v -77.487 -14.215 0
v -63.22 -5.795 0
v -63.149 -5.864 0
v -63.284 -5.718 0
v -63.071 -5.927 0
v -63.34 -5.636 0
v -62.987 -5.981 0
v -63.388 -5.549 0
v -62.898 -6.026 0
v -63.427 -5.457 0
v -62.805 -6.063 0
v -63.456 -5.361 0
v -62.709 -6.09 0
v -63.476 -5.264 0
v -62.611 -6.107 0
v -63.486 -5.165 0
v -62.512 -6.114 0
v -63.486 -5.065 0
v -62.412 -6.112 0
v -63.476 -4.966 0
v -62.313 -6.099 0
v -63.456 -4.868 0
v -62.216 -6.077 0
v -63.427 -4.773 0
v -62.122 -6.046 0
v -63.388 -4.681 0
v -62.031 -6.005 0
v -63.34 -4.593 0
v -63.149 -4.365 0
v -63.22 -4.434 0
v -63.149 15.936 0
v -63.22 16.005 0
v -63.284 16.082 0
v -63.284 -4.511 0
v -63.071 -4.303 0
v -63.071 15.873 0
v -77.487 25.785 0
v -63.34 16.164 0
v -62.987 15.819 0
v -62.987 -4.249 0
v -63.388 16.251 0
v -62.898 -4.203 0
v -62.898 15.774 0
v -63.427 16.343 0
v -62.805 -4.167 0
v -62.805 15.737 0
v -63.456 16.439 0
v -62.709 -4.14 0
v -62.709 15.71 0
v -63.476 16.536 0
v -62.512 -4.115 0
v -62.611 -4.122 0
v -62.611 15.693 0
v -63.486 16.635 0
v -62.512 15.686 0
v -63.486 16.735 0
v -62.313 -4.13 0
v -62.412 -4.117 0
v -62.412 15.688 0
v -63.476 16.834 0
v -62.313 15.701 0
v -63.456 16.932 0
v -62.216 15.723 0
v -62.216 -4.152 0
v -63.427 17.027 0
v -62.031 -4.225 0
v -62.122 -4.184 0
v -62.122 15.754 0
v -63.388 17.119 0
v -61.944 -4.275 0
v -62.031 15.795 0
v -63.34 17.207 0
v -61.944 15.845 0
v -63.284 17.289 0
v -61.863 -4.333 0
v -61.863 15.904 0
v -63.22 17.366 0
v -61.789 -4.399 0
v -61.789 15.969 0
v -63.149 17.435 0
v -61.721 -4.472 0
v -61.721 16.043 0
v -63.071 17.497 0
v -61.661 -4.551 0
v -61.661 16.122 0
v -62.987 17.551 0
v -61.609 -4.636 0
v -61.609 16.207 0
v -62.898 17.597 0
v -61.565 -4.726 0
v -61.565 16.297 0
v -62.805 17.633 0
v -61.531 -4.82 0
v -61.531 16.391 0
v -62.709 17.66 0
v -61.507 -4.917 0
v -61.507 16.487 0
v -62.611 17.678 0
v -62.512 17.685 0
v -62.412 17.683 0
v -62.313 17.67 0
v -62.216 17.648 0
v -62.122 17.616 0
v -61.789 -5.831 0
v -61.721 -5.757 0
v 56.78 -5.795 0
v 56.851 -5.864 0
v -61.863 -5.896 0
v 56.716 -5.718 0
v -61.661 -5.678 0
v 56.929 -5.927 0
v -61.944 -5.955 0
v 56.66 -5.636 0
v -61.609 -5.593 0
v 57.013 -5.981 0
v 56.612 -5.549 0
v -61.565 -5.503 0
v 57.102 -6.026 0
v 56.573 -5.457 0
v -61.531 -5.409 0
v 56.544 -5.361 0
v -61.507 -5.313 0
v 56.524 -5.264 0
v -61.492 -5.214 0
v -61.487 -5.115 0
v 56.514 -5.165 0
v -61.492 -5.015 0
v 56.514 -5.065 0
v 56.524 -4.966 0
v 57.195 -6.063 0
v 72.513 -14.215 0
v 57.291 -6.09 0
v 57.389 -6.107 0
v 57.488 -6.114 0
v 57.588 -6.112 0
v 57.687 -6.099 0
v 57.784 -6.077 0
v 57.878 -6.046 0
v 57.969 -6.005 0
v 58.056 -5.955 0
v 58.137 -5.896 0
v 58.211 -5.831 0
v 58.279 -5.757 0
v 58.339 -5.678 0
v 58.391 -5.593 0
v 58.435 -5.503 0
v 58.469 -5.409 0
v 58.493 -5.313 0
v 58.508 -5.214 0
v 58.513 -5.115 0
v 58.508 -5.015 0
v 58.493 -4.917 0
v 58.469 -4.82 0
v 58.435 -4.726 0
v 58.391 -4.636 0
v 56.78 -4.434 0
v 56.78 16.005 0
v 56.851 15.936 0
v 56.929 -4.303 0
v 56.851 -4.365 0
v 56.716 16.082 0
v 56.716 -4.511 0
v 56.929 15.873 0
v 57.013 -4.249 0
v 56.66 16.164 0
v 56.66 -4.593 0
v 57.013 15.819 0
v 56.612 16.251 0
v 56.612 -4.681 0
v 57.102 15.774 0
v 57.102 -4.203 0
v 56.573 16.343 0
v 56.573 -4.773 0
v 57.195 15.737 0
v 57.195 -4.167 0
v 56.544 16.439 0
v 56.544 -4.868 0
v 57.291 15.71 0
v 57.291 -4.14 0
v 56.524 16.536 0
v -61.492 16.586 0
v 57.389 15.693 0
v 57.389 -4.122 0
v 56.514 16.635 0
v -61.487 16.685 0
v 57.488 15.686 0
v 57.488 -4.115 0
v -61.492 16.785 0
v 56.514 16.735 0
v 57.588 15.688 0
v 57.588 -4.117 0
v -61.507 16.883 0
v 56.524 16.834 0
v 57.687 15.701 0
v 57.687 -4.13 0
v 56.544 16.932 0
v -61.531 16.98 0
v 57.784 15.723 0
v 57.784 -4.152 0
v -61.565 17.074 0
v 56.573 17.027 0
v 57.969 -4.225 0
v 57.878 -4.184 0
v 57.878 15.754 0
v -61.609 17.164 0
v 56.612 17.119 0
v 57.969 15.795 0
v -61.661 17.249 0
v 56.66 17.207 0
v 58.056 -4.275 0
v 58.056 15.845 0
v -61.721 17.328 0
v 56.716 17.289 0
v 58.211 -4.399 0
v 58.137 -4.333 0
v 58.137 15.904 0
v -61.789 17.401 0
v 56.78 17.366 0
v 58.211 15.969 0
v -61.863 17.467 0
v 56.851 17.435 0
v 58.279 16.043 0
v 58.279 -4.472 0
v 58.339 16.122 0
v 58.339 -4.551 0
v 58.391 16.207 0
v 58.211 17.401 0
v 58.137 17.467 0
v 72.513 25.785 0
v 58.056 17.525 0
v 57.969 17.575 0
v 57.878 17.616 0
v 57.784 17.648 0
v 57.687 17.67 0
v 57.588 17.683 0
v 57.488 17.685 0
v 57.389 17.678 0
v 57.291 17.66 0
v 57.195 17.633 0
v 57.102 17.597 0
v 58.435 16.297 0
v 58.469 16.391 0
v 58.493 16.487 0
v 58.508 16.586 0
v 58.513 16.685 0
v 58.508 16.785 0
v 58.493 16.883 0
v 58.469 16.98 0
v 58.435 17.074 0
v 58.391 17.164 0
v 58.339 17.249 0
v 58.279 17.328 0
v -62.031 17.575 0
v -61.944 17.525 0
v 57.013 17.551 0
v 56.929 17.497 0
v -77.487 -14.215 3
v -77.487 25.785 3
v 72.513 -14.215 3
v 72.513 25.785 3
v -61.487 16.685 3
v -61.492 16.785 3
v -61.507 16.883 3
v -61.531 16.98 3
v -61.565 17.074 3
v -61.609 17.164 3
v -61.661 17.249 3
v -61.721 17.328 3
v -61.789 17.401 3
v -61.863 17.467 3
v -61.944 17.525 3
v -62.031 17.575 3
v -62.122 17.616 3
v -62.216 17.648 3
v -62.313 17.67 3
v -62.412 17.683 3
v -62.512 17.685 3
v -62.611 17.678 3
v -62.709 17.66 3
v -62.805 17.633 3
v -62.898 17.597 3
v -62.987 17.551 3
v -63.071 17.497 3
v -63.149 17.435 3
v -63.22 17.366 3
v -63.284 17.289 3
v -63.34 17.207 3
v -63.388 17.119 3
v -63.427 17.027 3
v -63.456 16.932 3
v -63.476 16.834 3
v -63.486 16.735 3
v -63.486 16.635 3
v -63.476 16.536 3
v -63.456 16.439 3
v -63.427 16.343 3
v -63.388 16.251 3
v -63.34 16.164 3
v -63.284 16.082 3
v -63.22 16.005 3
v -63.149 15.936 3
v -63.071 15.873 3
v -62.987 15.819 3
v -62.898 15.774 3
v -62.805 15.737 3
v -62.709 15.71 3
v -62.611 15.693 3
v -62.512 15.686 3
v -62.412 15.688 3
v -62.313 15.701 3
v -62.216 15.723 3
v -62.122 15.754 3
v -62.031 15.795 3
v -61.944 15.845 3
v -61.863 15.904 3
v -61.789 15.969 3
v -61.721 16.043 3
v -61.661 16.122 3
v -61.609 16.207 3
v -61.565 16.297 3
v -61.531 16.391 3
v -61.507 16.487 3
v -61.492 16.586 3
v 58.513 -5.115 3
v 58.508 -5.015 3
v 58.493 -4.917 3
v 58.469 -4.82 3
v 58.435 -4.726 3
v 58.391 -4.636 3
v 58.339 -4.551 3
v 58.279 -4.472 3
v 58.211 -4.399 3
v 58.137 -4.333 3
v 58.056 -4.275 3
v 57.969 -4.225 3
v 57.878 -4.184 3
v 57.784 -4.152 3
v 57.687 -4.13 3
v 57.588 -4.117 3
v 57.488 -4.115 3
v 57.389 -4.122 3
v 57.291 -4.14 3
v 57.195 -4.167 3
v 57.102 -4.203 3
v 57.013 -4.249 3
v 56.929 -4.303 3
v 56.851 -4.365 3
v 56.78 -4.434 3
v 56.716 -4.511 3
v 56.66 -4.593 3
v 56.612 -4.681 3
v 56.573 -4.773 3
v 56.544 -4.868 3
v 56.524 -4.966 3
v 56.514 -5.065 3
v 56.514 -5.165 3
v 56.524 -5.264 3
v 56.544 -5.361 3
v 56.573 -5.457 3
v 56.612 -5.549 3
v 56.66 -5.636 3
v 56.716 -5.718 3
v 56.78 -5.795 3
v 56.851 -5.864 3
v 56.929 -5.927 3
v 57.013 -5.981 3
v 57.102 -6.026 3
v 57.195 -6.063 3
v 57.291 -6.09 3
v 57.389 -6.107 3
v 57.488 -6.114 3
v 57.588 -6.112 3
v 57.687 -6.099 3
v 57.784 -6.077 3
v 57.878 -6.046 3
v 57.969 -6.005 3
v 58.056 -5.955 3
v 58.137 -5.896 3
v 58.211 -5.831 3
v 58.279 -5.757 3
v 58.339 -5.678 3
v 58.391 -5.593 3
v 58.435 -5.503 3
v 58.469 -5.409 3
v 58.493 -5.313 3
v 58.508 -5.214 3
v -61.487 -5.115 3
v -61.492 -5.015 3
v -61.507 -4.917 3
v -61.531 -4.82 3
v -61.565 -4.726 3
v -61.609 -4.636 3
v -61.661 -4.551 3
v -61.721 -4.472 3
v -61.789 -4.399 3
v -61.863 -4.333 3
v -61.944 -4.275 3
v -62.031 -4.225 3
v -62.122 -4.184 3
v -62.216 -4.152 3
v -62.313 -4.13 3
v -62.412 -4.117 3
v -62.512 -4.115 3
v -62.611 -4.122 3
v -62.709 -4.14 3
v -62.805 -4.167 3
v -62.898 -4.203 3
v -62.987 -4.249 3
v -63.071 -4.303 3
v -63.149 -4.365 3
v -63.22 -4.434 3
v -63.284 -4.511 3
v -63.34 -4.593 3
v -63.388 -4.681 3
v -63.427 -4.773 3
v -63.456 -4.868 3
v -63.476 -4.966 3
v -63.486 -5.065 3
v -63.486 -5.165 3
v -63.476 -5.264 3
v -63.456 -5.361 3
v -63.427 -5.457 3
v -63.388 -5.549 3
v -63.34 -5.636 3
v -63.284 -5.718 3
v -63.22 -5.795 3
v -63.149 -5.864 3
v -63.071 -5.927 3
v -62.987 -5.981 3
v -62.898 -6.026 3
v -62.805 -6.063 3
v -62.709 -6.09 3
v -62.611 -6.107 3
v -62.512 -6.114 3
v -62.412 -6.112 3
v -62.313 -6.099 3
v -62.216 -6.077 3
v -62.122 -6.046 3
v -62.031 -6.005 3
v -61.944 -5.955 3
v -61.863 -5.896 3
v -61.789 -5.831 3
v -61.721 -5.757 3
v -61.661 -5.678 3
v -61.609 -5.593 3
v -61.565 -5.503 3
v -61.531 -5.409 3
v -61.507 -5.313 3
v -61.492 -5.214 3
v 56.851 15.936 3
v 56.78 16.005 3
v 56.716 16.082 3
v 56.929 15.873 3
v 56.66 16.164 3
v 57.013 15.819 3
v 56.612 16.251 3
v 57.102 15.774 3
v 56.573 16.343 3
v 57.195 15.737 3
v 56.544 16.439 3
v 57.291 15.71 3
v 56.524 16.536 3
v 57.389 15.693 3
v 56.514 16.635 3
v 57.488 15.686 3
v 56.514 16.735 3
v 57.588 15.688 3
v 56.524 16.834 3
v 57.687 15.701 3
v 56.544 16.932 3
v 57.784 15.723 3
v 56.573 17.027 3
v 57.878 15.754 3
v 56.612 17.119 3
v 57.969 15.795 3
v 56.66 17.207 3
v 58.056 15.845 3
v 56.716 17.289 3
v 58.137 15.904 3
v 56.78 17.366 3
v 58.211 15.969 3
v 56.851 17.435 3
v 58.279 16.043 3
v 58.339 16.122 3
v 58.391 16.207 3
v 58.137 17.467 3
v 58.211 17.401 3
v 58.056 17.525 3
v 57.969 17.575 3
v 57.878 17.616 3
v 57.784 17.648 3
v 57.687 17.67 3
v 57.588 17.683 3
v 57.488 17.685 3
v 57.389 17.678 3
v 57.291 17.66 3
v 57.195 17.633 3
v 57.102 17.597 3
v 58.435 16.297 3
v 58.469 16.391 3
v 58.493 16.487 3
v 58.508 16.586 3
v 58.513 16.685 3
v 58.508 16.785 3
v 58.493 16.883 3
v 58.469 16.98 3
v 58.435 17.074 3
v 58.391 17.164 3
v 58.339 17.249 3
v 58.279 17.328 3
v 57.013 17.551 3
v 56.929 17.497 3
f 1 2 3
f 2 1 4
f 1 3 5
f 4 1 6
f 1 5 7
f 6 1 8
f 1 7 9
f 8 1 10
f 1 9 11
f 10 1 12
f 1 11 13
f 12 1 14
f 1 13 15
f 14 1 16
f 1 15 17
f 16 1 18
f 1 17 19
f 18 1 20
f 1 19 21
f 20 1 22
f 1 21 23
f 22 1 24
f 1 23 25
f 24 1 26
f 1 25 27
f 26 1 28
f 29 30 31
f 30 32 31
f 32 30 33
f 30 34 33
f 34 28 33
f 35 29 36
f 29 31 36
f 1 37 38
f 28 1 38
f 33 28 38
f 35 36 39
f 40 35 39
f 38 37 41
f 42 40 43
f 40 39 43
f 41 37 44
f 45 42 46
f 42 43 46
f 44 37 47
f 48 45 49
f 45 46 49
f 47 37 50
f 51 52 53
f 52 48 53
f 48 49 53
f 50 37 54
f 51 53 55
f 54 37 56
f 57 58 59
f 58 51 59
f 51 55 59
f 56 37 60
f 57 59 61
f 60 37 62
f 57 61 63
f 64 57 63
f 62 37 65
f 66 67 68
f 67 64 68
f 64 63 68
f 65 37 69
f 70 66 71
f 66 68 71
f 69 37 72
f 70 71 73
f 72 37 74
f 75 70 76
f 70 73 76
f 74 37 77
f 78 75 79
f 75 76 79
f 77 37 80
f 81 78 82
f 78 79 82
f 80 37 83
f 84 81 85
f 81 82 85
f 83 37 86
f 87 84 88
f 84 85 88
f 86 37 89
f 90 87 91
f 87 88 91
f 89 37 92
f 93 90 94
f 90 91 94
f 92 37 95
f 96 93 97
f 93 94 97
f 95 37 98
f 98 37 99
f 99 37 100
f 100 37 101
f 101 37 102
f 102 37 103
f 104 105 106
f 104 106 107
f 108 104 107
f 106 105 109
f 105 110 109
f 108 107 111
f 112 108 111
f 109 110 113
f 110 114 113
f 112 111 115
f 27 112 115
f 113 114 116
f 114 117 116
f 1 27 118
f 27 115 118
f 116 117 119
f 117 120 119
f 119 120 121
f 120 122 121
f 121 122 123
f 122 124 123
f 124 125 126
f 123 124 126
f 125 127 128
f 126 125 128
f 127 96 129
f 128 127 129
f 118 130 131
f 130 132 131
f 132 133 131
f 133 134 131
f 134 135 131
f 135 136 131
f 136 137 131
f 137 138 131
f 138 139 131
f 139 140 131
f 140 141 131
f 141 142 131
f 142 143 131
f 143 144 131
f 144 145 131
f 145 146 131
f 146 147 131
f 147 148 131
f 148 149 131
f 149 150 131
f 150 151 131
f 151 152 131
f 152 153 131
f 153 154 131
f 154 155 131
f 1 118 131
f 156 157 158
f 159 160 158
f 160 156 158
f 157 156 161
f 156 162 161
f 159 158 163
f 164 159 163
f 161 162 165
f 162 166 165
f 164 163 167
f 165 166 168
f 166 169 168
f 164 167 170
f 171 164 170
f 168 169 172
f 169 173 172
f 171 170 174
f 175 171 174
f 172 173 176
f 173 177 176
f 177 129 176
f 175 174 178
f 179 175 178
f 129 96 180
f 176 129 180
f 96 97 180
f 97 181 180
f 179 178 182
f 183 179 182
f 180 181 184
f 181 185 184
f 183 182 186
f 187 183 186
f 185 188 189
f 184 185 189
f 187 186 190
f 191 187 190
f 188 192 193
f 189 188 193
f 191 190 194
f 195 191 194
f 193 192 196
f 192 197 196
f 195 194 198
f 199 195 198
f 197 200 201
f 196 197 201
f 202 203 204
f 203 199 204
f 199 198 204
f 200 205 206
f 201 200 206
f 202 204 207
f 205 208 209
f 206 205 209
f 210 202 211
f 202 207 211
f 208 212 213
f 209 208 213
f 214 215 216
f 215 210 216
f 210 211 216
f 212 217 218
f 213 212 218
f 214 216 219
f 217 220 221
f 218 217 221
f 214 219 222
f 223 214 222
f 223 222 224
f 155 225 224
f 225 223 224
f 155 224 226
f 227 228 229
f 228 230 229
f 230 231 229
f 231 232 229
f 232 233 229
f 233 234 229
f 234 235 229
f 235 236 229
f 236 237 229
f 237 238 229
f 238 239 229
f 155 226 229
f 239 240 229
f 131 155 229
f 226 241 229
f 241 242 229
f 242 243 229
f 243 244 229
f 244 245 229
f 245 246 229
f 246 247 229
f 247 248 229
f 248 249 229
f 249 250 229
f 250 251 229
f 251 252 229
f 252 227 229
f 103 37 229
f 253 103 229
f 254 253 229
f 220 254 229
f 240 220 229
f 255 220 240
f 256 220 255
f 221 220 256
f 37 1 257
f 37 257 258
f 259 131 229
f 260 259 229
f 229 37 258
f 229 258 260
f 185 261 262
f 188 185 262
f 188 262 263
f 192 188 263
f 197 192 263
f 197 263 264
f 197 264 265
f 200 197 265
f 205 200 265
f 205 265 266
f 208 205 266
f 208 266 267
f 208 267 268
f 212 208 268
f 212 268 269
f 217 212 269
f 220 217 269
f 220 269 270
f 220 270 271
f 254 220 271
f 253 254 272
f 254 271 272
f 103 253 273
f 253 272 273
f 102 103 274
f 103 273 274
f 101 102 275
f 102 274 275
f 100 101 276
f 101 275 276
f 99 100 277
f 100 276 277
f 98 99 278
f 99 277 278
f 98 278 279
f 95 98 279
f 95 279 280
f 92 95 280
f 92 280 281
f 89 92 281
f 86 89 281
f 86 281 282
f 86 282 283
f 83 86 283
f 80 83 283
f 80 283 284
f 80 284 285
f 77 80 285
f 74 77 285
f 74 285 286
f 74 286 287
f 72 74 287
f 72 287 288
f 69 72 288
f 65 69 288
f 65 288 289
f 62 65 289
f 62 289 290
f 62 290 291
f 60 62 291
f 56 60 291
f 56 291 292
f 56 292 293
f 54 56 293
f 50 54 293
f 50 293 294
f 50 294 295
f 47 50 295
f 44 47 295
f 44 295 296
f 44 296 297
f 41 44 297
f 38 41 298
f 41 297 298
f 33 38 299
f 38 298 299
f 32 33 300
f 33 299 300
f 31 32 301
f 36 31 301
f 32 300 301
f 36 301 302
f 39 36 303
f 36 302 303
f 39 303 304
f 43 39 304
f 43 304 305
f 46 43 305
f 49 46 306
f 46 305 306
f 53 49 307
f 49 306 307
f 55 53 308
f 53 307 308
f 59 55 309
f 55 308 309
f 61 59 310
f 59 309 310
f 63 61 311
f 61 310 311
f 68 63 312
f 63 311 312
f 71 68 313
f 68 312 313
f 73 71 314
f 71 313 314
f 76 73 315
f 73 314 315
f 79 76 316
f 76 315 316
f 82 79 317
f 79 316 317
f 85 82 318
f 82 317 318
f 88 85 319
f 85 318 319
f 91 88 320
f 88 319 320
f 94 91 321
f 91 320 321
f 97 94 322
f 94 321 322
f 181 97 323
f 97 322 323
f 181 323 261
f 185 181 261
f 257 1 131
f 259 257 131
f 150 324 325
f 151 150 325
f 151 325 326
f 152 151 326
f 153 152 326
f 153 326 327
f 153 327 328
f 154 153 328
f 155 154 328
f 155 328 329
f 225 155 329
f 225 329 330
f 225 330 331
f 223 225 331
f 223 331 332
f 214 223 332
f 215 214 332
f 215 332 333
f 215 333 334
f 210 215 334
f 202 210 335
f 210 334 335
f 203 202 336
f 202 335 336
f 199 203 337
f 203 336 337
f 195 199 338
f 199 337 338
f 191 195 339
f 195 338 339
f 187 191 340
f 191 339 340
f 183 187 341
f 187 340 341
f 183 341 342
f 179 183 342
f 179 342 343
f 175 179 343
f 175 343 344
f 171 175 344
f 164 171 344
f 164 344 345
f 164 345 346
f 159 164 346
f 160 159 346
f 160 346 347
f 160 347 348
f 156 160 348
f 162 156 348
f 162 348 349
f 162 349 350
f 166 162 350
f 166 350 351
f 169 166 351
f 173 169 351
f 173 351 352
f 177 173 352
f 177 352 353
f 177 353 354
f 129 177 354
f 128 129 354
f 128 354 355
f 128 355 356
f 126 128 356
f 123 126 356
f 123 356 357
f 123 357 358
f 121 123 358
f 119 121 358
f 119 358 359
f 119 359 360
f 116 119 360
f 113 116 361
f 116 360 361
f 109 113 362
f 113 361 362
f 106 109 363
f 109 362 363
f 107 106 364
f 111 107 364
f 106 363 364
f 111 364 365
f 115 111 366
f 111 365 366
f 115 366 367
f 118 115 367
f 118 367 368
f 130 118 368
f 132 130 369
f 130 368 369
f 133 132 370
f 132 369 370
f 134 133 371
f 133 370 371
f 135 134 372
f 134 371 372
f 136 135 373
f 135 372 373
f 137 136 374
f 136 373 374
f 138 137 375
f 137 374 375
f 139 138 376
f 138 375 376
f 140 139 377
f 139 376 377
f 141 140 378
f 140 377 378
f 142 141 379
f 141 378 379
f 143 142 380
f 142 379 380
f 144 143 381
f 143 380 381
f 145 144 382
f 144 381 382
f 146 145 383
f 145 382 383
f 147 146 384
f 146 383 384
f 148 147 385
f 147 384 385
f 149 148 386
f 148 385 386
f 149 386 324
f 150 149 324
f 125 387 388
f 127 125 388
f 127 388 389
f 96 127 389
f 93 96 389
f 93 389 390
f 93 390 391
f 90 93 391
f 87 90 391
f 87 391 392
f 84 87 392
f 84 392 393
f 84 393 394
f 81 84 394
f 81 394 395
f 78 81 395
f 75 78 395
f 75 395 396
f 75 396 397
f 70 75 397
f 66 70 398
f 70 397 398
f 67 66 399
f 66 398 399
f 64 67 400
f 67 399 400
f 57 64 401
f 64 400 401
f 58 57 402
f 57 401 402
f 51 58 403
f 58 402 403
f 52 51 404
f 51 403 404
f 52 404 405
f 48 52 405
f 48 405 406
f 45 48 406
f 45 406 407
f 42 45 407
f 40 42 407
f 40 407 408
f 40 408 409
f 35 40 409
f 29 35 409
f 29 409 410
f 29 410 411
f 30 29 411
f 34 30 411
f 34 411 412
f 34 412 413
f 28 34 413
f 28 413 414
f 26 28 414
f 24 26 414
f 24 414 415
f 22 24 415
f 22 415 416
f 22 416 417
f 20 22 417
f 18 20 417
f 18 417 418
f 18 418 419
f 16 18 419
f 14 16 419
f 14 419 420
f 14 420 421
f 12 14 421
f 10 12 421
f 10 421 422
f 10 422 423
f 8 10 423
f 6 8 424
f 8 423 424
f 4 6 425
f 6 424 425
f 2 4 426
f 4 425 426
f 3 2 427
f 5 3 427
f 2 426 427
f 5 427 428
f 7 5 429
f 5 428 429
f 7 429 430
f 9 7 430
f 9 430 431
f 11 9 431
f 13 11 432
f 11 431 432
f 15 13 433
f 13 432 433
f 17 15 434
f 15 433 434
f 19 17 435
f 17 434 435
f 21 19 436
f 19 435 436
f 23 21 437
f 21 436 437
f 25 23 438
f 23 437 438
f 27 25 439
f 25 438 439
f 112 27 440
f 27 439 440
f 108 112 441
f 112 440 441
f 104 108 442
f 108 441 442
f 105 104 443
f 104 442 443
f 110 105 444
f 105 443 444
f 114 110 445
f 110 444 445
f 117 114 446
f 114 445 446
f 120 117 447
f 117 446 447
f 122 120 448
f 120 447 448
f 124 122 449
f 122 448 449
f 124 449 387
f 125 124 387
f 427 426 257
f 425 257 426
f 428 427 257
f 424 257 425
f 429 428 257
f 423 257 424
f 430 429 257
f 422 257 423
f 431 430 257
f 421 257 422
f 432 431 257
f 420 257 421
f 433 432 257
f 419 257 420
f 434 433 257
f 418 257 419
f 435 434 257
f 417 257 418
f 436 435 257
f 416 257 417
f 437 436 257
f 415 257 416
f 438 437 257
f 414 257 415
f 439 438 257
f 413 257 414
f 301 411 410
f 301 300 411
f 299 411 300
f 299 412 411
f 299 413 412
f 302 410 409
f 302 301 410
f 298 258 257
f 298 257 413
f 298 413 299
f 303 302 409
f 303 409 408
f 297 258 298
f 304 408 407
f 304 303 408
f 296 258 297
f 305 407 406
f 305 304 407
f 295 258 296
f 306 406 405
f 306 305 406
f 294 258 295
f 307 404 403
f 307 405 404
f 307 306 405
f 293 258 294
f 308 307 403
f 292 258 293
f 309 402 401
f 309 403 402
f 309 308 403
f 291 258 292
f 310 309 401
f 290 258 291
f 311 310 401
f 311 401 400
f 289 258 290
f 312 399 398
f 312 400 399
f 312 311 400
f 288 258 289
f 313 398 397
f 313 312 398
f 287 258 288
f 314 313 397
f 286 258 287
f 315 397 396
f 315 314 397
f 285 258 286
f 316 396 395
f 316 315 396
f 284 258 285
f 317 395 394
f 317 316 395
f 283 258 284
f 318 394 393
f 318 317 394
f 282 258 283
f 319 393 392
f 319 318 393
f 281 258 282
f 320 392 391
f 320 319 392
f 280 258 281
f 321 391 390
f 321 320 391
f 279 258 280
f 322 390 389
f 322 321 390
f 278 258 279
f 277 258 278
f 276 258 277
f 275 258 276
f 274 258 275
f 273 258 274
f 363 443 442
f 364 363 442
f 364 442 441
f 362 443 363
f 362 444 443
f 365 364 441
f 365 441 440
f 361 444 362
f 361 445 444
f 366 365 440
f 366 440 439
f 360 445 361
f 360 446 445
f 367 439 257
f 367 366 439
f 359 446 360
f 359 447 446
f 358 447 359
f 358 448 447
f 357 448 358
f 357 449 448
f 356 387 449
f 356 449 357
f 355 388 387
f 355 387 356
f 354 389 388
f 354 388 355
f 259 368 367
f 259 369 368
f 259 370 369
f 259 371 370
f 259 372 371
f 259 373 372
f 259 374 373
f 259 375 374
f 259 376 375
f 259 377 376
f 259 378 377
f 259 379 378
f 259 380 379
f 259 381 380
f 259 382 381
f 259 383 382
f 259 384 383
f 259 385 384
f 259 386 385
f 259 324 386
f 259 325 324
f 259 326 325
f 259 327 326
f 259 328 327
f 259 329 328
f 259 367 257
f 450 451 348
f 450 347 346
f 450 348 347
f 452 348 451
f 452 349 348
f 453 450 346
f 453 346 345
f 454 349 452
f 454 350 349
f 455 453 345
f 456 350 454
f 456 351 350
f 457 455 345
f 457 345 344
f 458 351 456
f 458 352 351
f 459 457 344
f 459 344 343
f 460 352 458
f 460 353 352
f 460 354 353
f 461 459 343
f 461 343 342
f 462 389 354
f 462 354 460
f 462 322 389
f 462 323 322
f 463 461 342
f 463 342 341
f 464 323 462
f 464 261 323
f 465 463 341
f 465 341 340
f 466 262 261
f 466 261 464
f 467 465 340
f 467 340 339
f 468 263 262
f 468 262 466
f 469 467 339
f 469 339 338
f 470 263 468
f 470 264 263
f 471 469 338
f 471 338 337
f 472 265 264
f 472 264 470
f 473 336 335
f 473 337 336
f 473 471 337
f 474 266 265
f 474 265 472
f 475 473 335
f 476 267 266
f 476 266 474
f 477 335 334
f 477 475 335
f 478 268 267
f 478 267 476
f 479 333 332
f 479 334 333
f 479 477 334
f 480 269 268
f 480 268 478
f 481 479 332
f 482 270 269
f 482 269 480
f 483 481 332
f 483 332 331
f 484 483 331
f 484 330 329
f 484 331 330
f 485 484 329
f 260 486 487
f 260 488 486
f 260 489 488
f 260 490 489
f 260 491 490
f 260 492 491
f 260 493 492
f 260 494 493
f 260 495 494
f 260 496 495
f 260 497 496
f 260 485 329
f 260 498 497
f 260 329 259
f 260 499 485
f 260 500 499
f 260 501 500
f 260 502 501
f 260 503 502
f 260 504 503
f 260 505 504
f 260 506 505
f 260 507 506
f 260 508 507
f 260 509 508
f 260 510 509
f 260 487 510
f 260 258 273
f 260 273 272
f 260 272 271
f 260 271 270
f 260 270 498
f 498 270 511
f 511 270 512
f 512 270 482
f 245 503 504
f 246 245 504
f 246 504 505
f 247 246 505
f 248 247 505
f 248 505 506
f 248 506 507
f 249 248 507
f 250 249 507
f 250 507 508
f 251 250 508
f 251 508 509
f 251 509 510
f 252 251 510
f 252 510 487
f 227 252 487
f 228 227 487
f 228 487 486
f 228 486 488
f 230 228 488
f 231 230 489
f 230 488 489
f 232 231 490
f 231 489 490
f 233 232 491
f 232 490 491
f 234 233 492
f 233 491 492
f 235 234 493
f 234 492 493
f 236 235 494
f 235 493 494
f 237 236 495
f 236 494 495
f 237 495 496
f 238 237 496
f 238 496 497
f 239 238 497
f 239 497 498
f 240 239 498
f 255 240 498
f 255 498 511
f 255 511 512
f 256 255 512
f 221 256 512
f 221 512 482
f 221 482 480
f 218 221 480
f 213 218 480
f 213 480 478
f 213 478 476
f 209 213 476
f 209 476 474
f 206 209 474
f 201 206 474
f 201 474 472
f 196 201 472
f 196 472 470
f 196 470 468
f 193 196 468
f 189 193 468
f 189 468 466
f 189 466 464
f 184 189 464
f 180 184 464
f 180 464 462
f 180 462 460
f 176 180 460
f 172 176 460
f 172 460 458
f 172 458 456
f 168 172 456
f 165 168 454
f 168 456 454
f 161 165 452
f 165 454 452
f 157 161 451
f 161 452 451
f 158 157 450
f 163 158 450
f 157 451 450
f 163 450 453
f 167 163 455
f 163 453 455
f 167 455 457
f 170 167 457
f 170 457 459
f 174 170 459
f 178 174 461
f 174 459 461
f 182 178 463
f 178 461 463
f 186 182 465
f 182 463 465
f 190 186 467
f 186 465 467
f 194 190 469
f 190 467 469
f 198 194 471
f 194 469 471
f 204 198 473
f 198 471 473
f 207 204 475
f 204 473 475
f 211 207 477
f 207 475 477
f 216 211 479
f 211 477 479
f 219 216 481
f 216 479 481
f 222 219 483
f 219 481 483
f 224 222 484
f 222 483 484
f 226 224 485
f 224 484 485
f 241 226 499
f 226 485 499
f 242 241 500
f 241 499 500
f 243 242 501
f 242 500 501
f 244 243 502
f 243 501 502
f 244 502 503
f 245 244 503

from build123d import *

# Parameters (mm, degrees)
SKETCH1_W           = 150
SKETCH1_H           = 40
BOSS_EXTRUDE1_DEPTH = 3
SKETCH2_R           = 1
CUT_EXTRUDE1_DEPTH  = 10


with BuildPart() as part:
    # Sketch1 → Boss-Extrude1 (new body)
    with BuildSketch(Plane.XY):
        with Locations((-2.486910995, 5.785340314)):
            Rectangle(SKETCH1_W, SKETCH1_H)
    extrude(amount=BOSS_EXTRUDE1_DEPTH)

    # Sketch2 → Cut-Extrude1 (cut)
    with BuildSketch(Plane.XY.offset(3)):
        with Locations((-62.486910995, 16.685340314)):
            Circle(SKETCH2_R)
        with Locations((57.513089005, 16.685340314)):
            Circle(SKETCH2_R)
        with Locations((57.513089005, -5.114659686)):
            Circle(SKETCH2_R)
        with Locations((-62.486910995, -5.114659686)):
            Circle(SKETCH2_R)
    extrude(amount=-CUT_EXTRUDE1_DEPTH, mode=Mode.SUBTRACT)


solid = part.part
